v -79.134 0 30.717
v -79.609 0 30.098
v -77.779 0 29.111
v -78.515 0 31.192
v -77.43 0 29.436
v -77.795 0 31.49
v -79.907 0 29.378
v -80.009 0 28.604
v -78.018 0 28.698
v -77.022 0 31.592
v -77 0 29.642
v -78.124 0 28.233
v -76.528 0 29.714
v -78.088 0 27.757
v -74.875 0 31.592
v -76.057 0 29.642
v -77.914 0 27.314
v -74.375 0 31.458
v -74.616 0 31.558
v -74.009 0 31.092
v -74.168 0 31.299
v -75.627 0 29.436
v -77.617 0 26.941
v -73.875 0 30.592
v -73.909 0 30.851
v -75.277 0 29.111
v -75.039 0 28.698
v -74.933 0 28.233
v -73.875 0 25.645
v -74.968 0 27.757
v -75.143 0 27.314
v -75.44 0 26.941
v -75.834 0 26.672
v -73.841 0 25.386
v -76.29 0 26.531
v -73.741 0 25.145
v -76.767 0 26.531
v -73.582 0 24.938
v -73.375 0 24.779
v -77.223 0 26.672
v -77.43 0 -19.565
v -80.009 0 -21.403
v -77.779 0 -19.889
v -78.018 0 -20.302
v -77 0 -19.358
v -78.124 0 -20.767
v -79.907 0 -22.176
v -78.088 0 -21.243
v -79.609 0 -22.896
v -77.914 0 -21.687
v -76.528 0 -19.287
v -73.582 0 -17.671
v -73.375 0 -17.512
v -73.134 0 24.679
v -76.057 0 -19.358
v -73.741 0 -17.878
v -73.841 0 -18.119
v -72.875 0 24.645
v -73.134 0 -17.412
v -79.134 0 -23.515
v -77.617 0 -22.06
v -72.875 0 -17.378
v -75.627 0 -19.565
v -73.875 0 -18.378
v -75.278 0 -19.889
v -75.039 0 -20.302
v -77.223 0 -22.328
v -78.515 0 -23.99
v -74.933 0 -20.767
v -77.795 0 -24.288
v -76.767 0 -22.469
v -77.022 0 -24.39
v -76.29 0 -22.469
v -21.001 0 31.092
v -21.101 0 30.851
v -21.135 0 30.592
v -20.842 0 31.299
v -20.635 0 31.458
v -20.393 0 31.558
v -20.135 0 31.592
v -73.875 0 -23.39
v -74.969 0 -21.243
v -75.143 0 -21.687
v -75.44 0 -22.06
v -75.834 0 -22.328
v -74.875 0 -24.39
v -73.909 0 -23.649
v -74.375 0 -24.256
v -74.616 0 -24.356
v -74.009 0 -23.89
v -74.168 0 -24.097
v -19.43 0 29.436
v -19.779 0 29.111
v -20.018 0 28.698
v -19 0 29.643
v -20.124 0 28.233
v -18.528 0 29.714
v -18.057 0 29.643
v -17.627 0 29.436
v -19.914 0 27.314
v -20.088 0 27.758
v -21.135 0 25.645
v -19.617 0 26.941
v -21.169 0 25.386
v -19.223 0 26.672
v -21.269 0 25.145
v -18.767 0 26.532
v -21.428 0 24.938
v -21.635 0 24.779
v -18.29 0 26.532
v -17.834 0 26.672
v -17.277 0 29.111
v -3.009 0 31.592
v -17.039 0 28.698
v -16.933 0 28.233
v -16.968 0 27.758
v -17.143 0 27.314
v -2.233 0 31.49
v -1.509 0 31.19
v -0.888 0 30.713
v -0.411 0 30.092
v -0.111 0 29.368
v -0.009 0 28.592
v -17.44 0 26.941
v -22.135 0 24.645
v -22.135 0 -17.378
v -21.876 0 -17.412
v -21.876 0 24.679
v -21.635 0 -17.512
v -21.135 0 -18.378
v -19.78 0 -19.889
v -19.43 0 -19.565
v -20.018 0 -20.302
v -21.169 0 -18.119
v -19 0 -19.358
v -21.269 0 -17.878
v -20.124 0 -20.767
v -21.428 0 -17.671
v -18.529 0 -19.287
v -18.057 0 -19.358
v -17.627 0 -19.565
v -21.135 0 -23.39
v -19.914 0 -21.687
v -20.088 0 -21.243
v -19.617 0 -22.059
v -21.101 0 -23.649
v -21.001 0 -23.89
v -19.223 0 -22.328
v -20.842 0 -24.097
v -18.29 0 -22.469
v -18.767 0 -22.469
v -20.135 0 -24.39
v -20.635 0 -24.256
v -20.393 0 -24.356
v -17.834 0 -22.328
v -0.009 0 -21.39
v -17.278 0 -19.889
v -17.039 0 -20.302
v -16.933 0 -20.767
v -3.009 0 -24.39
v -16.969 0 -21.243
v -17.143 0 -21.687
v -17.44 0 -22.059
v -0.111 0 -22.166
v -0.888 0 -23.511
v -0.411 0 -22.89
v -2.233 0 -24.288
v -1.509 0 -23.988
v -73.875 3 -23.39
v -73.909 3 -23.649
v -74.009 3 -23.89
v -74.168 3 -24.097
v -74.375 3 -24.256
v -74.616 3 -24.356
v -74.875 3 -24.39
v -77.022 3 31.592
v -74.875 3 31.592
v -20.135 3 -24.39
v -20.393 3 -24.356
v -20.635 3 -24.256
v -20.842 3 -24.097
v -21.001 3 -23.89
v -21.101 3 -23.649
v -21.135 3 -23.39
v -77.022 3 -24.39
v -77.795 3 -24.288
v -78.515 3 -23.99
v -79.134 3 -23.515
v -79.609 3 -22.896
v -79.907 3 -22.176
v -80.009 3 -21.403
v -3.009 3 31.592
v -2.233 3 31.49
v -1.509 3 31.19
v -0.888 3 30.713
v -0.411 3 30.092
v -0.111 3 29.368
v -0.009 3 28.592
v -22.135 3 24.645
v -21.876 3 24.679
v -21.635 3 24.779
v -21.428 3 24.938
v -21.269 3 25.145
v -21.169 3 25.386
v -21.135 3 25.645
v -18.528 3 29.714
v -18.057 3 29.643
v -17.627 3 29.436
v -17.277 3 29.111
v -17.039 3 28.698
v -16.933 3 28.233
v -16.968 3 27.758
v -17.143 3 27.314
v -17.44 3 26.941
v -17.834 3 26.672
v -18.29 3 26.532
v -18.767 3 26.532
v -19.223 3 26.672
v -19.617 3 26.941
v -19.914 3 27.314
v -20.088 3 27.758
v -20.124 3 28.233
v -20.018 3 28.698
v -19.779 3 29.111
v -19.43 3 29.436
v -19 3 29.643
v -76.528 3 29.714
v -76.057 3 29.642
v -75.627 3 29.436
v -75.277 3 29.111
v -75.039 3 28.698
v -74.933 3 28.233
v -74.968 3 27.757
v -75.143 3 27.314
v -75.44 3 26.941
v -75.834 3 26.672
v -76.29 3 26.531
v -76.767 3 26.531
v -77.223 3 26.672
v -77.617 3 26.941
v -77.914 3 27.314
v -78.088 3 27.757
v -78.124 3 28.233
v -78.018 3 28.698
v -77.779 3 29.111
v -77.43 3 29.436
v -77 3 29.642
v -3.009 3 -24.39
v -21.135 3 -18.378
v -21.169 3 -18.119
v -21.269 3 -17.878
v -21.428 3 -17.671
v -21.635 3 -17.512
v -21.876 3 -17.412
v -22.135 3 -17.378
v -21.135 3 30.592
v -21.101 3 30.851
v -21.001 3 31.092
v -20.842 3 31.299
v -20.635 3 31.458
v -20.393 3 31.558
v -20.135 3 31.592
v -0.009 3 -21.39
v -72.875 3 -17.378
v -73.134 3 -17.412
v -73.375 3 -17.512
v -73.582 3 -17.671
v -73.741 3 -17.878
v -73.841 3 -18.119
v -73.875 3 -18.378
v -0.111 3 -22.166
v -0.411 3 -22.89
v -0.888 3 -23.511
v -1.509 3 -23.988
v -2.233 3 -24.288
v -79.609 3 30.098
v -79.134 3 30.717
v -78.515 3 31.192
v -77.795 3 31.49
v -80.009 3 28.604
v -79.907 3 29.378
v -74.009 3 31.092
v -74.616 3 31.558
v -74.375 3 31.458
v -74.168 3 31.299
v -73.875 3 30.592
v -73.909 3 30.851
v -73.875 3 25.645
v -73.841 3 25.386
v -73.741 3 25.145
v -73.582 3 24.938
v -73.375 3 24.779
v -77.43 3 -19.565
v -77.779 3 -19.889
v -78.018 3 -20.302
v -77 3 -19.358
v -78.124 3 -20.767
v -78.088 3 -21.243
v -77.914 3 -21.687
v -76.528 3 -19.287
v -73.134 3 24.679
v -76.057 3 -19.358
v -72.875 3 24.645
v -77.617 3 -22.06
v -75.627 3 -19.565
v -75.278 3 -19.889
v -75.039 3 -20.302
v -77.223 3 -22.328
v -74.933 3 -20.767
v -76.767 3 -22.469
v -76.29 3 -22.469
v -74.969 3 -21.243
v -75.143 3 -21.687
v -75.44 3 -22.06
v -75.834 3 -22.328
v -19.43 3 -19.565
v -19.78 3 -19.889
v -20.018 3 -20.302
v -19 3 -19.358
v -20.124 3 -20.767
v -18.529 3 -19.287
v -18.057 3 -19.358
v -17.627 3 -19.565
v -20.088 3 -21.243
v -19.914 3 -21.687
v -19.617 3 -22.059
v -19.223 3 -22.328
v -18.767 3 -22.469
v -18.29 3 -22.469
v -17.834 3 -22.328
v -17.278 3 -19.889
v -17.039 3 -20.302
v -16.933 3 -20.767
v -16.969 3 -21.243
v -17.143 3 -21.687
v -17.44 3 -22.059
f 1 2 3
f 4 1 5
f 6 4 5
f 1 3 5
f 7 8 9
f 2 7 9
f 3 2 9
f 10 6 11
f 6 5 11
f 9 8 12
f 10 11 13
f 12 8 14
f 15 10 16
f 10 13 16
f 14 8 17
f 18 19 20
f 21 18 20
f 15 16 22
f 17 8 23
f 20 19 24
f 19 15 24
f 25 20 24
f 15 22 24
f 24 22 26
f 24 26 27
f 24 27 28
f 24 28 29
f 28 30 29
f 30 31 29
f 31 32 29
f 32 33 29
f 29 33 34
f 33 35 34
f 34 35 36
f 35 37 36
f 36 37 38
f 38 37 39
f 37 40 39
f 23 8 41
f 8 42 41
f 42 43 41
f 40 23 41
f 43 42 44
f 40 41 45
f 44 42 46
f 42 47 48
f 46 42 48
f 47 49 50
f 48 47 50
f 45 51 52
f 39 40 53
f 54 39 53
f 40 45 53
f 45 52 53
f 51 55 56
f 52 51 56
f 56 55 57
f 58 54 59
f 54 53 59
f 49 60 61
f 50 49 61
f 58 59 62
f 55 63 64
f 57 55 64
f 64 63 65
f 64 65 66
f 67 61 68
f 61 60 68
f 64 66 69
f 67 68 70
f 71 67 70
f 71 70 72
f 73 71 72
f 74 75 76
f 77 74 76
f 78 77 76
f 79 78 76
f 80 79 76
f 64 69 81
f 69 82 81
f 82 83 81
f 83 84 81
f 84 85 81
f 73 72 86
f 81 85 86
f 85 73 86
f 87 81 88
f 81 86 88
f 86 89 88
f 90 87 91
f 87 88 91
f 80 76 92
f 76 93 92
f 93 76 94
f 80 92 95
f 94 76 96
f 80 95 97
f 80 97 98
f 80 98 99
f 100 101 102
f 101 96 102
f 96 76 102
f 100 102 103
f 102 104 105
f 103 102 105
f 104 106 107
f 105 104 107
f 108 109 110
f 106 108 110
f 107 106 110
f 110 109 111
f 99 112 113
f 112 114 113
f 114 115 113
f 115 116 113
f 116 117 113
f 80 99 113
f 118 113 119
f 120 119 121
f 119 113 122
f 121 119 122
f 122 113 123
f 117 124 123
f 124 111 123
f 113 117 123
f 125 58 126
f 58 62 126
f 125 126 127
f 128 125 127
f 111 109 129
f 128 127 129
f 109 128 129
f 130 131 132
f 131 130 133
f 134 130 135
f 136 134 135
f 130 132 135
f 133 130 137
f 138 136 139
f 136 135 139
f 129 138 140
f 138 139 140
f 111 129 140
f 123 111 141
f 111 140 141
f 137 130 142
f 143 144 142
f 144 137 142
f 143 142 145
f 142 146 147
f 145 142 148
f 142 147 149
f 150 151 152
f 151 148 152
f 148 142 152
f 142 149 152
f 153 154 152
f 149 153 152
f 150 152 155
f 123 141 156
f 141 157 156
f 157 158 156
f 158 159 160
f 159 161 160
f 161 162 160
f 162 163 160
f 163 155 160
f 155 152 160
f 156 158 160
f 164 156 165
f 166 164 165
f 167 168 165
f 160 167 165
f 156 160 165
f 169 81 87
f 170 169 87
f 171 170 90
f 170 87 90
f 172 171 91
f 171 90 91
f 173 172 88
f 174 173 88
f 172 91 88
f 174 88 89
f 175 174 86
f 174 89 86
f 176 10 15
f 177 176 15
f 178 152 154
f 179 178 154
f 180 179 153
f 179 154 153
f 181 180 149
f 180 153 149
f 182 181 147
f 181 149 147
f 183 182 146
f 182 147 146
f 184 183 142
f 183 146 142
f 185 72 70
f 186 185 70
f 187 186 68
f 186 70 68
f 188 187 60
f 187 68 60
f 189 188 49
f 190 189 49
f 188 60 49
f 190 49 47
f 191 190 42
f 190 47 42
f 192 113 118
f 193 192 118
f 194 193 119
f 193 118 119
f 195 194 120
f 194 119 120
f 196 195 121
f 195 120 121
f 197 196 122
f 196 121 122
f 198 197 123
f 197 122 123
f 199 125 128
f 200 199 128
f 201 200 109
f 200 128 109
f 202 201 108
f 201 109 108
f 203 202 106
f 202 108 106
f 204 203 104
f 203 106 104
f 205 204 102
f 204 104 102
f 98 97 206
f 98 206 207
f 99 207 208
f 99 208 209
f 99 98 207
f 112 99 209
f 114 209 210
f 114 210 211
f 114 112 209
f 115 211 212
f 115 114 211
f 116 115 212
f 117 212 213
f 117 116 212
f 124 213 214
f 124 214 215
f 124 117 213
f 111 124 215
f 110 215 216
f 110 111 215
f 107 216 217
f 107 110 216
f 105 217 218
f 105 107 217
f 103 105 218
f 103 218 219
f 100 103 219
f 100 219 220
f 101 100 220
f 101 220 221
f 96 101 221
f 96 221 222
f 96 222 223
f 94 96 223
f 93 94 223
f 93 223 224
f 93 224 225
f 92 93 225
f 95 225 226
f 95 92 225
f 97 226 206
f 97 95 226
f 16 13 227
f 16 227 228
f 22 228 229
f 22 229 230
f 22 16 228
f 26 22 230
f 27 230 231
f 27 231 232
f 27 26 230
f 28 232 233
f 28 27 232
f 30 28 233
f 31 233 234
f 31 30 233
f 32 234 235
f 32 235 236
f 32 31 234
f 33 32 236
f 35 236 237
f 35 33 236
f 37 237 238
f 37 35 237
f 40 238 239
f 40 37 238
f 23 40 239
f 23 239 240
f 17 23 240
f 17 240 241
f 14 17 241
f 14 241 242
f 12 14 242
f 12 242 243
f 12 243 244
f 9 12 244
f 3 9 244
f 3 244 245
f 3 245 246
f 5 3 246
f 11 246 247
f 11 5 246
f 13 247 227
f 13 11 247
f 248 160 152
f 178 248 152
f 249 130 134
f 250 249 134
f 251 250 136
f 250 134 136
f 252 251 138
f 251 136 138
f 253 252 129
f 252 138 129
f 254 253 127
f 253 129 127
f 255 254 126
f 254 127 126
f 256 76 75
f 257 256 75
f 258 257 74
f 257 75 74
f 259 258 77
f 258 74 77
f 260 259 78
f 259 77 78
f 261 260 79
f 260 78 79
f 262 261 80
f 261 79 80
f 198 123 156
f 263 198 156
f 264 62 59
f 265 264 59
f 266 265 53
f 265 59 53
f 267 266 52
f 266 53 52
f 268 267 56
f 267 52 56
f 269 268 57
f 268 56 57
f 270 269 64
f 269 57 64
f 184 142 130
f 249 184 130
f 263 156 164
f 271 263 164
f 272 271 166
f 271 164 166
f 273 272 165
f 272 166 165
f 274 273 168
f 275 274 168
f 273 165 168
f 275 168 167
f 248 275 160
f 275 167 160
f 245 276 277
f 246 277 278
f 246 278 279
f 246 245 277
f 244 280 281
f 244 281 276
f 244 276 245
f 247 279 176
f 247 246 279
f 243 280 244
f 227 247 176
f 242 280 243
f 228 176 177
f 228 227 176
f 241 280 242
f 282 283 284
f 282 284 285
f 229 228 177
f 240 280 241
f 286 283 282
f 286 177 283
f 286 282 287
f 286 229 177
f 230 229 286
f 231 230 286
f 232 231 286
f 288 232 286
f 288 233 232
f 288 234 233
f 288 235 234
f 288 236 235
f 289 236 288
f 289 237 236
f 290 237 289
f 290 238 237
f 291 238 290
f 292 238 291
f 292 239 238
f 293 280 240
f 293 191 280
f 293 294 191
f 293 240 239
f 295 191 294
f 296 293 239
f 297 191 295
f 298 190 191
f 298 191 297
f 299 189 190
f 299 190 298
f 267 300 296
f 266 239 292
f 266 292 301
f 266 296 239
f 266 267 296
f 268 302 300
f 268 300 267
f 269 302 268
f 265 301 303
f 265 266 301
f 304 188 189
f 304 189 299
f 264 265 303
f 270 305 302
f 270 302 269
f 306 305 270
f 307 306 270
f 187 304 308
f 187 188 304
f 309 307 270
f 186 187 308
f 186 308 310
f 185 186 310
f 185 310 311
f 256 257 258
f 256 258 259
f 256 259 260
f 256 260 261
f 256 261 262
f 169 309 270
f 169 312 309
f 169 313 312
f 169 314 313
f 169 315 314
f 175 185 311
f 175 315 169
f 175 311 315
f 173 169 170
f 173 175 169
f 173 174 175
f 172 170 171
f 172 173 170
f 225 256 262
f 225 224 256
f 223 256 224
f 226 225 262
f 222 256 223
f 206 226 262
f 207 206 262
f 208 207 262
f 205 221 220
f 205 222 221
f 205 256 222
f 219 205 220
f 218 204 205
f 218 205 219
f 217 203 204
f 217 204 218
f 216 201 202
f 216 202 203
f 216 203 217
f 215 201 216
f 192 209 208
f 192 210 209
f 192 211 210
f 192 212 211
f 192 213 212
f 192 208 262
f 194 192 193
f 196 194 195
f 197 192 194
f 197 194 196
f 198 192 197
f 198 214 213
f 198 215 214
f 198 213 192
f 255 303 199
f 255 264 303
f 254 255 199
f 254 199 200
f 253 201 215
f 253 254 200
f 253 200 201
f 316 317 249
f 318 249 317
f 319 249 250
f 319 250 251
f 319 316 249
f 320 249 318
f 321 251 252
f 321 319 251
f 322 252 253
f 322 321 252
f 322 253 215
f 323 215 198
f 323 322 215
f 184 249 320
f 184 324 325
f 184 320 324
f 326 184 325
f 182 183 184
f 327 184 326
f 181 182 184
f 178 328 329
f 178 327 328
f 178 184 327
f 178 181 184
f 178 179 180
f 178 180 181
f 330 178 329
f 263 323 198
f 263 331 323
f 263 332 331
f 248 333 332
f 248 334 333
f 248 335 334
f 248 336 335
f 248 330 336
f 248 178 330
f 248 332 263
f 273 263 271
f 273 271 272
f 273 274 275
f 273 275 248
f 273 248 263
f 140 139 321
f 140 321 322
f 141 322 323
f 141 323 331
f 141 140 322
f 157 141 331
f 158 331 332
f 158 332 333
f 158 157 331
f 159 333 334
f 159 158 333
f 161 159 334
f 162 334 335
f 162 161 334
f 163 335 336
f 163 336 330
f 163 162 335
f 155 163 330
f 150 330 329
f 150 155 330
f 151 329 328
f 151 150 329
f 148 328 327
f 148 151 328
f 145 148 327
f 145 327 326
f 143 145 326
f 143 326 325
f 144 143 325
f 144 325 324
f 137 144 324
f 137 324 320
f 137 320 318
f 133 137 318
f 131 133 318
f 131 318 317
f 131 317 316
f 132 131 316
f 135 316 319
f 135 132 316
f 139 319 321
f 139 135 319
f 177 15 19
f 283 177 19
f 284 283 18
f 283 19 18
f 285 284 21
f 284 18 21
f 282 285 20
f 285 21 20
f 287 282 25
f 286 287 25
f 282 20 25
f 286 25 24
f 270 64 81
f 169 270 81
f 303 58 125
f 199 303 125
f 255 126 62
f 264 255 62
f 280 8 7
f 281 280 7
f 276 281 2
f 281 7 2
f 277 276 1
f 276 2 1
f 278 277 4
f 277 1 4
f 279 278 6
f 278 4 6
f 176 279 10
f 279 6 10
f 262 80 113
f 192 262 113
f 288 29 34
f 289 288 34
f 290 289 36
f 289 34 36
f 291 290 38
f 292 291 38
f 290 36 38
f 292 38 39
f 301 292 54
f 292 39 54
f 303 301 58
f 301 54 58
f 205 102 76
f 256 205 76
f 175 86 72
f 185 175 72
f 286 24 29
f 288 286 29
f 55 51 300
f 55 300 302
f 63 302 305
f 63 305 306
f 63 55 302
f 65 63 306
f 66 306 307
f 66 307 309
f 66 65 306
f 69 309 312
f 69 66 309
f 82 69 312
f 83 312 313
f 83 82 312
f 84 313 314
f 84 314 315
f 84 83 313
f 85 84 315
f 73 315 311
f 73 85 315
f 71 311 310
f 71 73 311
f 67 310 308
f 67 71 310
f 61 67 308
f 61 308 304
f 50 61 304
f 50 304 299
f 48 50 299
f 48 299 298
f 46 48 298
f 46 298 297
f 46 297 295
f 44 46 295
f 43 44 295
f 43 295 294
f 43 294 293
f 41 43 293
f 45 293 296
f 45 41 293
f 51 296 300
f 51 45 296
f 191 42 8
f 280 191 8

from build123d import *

# Parameters (mm, degrees)
SKETCH_1_R      = 1.6
EXTRUDE_1_DEPTH = 3


with BuildPart() as part:
    # 草图1 → 凸台-拉伸1 (new body)
    with BuildSketch(Plane(origin=(0, 0, 0), x_dir=(1, 0, 0), z_dir=(0, 1, 0))):
        with BuildLine():
            Line((-21.134628196, 23.389975432), (-21.134628196, 18.377736005))
            ThreePointArc((-21.134628196, 18.377736005), (-21.427521415, 17.670629223), (-22.134628196, 17.377736005))
            Line((-22.134628196, 17.377736005), (-72.874730915, 17.377736005))
            ThreePointArc((-72.874730915, 17.377736005), (-73.581837696, 17.670629223), (-73.874730915, 18.377736005))
            Line((-73.874730915, 18.377736005), (-73.874730915, 23.389975432))
            ThreePointArc((-73.874730915, 23.389975432), (-74.167624134, 24.097082213), (-74.874730915, 24.389975432))
            Line((-74.874730915, 24.389975432), (-77.021723127, 24.389975432))
            ThreePointArc((-77.021723127, 24.389975432), (-79.134066788, 23.515014039), (-80.009028181, 21.402670377))
            Line((-80.009028181, 21.402670377), (-80.009028181, -28.604431477))
            ThreePointArc((-80.009028181, -28.604431477), (-79.134066788, -30.716775138), (-77.021723127, -31.591736531))
            Line((-77.021723127, -31.591736531), (-74.874730915, -31.591736531))
            ThreePointArc((-74.874730915, -31.591736531), (-74.167624134, -31.298843313), (-73.874730915, -30.591736531))
            Line((-73.874730915, -30.591736531), (-73.874730915, -25.64502865))
            ThreePointArc((-73.874730915, -25.64502865), (-73.581837696, -24.937921869), (-72.874730915, -24.64502865))
            Line((-72.874730915, -24.64502865), (-22.134628196, -24.64502865))
            ThreePointArc((-22.134628196, -24.64502865), (-21.427521415, -24.937921869), (-21.134628196, -25.64502865))
            Line((-21.134628196, -25.64502865), (-21.134628196, -30.591736531))
            ThreePointArc((-21.134628196, -30.591736531), (-20.841734977, -31.298843313), (-20.134628196, -31.591736531))
            Line((-20.134628196, -31.591736531), (-3.009028181, -31.591736531))
            ThreePointArc((-3.009028181, -31.591736531), (-0.887707838, -30.713056875), (-0.009028181, -28.591736531))
            Line((-0.009028181, -28.591736531), (-0.009028181, -21.760486998))
            Line((-0.009028181, -21.760486998), (-0.009028181, 21.389975432))
            ThreePointArc((-0.009028181, 21.389975432), (-0.887707838, 23.511295776), (-3.009028181, 24.389975432))
            Line((-3.009028181, 24.389975432), (-20.134628196, 24.389975432))
            ThreePointArc((-20.134628196, 24.389975432), (-20.841734977, 24.097082213), (-21.134628196, 23.389975432))
        make_face()
        with Locations(Location((-76.52848462, 20.886724226, 0), (0, 0, 270))):
            Circle(SKETCH_1_R, mode=Mode.SUBTRACT)
        with Locations(Location((-18.52858622, 20.886597225, 0), (0, 0, 270))):
            Circle(SKETCH_1_R, mode=Mode.SUBTRACT)
        with Locations(Location((-18.52833222, -28.113656775, 0), (0, 0, 270))):
            Circle(SKETCH_1_R, mode=Mode.SUBTRACT)
        with Locations(Location((-76.52833222, -28.113529775, 0), (0, 0, 270))):
            Circle(SKETCH_1_R, mode=Mode.SUBTRACT)
    extrude(amount=EXTRUDE_1_DEPTH)


solid = part.part
